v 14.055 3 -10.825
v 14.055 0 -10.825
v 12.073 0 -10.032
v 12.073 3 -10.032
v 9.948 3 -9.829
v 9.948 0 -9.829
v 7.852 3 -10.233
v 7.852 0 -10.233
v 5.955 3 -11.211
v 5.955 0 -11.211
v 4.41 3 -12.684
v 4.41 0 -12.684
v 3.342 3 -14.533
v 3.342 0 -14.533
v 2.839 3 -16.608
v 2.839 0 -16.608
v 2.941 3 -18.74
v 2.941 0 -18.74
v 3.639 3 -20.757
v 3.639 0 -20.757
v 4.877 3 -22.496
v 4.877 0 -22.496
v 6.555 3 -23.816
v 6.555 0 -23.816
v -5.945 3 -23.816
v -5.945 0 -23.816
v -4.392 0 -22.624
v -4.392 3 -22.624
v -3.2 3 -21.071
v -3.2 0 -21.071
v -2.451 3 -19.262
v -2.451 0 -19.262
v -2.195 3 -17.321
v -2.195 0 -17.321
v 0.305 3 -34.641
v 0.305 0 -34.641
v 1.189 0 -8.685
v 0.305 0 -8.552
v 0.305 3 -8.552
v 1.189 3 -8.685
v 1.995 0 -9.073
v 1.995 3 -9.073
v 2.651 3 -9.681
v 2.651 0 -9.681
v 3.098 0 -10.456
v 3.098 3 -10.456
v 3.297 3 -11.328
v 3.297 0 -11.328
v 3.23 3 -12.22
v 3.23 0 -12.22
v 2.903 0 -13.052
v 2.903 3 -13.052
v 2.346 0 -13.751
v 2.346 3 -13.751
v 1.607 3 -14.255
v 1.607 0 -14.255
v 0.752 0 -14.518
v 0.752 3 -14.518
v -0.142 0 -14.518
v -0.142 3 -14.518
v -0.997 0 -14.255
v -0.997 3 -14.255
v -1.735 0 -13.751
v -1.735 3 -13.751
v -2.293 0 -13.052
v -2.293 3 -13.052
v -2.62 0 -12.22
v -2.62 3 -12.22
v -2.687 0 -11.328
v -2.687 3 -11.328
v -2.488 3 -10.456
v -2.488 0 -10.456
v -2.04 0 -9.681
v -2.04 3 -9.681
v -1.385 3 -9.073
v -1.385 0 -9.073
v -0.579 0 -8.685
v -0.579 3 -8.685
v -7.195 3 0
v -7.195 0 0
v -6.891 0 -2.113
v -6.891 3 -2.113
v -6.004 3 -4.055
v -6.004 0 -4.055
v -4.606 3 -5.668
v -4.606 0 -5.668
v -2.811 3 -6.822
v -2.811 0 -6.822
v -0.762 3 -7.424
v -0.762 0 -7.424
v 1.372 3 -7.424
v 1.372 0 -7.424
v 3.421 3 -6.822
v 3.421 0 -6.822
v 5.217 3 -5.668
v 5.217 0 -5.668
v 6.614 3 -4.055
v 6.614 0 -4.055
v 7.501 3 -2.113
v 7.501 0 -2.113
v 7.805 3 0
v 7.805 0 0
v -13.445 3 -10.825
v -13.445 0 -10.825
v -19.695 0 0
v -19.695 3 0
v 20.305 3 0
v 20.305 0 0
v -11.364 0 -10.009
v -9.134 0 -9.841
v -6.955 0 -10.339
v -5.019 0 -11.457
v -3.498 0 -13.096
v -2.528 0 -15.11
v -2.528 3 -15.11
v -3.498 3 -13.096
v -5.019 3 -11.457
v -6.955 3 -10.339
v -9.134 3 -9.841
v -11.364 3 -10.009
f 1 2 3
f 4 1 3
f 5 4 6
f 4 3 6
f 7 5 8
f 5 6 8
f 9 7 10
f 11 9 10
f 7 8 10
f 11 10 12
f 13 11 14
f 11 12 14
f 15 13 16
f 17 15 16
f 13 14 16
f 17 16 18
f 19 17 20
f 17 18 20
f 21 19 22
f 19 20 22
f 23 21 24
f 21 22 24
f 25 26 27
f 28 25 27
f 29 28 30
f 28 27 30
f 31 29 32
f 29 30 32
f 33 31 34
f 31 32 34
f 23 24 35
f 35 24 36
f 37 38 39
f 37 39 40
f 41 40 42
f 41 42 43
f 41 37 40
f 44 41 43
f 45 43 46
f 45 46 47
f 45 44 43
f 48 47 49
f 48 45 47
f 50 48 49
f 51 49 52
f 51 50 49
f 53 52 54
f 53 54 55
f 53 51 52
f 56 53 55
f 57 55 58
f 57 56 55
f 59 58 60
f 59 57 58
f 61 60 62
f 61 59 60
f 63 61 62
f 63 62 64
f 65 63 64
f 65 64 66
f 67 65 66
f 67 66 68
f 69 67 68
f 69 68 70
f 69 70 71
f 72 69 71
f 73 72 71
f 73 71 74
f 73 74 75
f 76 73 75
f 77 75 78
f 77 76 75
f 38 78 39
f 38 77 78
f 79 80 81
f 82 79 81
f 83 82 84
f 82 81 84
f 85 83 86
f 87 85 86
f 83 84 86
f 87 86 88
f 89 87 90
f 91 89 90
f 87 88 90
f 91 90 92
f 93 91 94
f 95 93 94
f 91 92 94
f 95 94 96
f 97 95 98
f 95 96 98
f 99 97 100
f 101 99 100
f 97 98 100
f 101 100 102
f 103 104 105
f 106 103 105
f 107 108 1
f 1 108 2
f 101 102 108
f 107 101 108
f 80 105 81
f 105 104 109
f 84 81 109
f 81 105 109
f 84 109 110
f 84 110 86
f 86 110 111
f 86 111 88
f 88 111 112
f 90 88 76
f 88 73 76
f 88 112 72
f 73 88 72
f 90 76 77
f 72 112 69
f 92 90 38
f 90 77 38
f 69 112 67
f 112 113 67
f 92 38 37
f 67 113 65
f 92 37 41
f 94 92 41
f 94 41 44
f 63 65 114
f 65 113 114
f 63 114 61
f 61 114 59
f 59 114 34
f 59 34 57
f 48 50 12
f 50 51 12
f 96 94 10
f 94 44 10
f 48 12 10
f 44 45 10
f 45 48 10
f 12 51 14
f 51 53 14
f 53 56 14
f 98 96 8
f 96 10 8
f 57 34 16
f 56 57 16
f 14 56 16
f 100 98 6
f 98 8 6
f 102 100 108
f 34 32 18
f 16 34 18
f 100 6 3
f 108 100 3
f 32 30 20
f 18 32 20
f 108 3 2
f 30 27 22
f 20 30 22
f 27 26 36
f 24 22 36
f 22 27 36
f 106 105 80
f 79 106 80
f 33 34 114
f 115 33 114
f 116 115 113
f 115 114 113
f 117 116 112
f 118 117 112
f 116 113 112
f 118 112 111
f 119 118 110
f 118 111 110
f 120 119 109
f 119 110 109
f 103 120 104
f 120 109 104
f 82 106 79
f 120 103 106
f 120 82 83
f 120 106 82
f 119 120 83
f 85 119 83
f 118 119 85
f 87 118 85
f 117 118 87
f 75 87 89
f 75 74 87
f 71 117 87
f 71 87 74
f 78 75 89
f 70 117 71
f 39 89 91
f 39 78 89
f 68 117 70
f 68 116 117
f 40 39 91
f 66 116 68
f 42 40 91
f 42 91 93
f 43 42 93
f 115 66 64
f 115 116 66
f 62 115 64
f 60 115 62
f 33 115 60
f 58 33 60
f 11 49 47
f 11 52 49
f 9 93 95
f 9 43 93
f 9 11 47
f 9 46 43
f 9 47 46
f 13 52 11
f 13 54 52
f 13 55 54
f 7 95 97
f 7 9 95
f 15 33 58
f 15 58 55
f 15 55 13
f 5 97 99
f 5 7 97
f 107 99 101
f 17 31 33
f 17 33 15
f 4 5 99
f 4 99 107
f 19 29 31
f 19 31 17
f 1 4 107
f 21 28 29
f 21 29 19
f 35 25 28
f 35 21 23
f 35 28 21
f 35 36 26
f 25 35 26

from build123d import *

# Parameters (mm, degrees)
SKETCH1_R           = 3
BOSS_EXTRUDE1_DEPTH = 3


with BuildPart() as part:
    # Sketch1 → Boss-Extrude1 (new body)
    with BuildSketch(Plane(origin=(0, 0, 0), x_dir=(1, 0, 0), z_dir=(0, 1, 0))):
        with BuildLine():
            Line((6.555052507, 23.815698604), (0.305052507, 34.641016151))
            Line((0.305052507, 34.641016151), (-5.944947493, 23.815698604))
            ThreePointArc((-5.944947493, 23.815698604), (-3.199756965, 21.070508076), (-2.194947493, 17.320508076))
            ThreePointArc((-2.194947493, 17.320508076), (-5.944947493, 10.825317547), (-13.444947493, 10.825317547))
            Line((-13.444947493, 10.825317547), (-19.694947493, 0))
            Line((-19.694947493, 0), (-7.194947493, 0))
            ThreePointArc((-7.194947493, 0), (0.305052507, 7.5), (7.805052507, 0))
            Line((7.805052507, 0), (20.305052507, 0))
            Line((20.305052507, 0), (14.055052507, 10.825317547))
            ThreePointArc((14.055052507, 10.825317547), (3.809861978, 13.570508076), (6.555052507, 23.815698604))
        make_face()
        with Locations(Location((0.305052507, 11.551965164, 0), (0, 0, 270))):
            Circle(SKETCH1_R, mode=Mode.SUBTRACT)
    extrude(amount=BOSS_EXTRUDE1_DEPTH)


solid = part.part
